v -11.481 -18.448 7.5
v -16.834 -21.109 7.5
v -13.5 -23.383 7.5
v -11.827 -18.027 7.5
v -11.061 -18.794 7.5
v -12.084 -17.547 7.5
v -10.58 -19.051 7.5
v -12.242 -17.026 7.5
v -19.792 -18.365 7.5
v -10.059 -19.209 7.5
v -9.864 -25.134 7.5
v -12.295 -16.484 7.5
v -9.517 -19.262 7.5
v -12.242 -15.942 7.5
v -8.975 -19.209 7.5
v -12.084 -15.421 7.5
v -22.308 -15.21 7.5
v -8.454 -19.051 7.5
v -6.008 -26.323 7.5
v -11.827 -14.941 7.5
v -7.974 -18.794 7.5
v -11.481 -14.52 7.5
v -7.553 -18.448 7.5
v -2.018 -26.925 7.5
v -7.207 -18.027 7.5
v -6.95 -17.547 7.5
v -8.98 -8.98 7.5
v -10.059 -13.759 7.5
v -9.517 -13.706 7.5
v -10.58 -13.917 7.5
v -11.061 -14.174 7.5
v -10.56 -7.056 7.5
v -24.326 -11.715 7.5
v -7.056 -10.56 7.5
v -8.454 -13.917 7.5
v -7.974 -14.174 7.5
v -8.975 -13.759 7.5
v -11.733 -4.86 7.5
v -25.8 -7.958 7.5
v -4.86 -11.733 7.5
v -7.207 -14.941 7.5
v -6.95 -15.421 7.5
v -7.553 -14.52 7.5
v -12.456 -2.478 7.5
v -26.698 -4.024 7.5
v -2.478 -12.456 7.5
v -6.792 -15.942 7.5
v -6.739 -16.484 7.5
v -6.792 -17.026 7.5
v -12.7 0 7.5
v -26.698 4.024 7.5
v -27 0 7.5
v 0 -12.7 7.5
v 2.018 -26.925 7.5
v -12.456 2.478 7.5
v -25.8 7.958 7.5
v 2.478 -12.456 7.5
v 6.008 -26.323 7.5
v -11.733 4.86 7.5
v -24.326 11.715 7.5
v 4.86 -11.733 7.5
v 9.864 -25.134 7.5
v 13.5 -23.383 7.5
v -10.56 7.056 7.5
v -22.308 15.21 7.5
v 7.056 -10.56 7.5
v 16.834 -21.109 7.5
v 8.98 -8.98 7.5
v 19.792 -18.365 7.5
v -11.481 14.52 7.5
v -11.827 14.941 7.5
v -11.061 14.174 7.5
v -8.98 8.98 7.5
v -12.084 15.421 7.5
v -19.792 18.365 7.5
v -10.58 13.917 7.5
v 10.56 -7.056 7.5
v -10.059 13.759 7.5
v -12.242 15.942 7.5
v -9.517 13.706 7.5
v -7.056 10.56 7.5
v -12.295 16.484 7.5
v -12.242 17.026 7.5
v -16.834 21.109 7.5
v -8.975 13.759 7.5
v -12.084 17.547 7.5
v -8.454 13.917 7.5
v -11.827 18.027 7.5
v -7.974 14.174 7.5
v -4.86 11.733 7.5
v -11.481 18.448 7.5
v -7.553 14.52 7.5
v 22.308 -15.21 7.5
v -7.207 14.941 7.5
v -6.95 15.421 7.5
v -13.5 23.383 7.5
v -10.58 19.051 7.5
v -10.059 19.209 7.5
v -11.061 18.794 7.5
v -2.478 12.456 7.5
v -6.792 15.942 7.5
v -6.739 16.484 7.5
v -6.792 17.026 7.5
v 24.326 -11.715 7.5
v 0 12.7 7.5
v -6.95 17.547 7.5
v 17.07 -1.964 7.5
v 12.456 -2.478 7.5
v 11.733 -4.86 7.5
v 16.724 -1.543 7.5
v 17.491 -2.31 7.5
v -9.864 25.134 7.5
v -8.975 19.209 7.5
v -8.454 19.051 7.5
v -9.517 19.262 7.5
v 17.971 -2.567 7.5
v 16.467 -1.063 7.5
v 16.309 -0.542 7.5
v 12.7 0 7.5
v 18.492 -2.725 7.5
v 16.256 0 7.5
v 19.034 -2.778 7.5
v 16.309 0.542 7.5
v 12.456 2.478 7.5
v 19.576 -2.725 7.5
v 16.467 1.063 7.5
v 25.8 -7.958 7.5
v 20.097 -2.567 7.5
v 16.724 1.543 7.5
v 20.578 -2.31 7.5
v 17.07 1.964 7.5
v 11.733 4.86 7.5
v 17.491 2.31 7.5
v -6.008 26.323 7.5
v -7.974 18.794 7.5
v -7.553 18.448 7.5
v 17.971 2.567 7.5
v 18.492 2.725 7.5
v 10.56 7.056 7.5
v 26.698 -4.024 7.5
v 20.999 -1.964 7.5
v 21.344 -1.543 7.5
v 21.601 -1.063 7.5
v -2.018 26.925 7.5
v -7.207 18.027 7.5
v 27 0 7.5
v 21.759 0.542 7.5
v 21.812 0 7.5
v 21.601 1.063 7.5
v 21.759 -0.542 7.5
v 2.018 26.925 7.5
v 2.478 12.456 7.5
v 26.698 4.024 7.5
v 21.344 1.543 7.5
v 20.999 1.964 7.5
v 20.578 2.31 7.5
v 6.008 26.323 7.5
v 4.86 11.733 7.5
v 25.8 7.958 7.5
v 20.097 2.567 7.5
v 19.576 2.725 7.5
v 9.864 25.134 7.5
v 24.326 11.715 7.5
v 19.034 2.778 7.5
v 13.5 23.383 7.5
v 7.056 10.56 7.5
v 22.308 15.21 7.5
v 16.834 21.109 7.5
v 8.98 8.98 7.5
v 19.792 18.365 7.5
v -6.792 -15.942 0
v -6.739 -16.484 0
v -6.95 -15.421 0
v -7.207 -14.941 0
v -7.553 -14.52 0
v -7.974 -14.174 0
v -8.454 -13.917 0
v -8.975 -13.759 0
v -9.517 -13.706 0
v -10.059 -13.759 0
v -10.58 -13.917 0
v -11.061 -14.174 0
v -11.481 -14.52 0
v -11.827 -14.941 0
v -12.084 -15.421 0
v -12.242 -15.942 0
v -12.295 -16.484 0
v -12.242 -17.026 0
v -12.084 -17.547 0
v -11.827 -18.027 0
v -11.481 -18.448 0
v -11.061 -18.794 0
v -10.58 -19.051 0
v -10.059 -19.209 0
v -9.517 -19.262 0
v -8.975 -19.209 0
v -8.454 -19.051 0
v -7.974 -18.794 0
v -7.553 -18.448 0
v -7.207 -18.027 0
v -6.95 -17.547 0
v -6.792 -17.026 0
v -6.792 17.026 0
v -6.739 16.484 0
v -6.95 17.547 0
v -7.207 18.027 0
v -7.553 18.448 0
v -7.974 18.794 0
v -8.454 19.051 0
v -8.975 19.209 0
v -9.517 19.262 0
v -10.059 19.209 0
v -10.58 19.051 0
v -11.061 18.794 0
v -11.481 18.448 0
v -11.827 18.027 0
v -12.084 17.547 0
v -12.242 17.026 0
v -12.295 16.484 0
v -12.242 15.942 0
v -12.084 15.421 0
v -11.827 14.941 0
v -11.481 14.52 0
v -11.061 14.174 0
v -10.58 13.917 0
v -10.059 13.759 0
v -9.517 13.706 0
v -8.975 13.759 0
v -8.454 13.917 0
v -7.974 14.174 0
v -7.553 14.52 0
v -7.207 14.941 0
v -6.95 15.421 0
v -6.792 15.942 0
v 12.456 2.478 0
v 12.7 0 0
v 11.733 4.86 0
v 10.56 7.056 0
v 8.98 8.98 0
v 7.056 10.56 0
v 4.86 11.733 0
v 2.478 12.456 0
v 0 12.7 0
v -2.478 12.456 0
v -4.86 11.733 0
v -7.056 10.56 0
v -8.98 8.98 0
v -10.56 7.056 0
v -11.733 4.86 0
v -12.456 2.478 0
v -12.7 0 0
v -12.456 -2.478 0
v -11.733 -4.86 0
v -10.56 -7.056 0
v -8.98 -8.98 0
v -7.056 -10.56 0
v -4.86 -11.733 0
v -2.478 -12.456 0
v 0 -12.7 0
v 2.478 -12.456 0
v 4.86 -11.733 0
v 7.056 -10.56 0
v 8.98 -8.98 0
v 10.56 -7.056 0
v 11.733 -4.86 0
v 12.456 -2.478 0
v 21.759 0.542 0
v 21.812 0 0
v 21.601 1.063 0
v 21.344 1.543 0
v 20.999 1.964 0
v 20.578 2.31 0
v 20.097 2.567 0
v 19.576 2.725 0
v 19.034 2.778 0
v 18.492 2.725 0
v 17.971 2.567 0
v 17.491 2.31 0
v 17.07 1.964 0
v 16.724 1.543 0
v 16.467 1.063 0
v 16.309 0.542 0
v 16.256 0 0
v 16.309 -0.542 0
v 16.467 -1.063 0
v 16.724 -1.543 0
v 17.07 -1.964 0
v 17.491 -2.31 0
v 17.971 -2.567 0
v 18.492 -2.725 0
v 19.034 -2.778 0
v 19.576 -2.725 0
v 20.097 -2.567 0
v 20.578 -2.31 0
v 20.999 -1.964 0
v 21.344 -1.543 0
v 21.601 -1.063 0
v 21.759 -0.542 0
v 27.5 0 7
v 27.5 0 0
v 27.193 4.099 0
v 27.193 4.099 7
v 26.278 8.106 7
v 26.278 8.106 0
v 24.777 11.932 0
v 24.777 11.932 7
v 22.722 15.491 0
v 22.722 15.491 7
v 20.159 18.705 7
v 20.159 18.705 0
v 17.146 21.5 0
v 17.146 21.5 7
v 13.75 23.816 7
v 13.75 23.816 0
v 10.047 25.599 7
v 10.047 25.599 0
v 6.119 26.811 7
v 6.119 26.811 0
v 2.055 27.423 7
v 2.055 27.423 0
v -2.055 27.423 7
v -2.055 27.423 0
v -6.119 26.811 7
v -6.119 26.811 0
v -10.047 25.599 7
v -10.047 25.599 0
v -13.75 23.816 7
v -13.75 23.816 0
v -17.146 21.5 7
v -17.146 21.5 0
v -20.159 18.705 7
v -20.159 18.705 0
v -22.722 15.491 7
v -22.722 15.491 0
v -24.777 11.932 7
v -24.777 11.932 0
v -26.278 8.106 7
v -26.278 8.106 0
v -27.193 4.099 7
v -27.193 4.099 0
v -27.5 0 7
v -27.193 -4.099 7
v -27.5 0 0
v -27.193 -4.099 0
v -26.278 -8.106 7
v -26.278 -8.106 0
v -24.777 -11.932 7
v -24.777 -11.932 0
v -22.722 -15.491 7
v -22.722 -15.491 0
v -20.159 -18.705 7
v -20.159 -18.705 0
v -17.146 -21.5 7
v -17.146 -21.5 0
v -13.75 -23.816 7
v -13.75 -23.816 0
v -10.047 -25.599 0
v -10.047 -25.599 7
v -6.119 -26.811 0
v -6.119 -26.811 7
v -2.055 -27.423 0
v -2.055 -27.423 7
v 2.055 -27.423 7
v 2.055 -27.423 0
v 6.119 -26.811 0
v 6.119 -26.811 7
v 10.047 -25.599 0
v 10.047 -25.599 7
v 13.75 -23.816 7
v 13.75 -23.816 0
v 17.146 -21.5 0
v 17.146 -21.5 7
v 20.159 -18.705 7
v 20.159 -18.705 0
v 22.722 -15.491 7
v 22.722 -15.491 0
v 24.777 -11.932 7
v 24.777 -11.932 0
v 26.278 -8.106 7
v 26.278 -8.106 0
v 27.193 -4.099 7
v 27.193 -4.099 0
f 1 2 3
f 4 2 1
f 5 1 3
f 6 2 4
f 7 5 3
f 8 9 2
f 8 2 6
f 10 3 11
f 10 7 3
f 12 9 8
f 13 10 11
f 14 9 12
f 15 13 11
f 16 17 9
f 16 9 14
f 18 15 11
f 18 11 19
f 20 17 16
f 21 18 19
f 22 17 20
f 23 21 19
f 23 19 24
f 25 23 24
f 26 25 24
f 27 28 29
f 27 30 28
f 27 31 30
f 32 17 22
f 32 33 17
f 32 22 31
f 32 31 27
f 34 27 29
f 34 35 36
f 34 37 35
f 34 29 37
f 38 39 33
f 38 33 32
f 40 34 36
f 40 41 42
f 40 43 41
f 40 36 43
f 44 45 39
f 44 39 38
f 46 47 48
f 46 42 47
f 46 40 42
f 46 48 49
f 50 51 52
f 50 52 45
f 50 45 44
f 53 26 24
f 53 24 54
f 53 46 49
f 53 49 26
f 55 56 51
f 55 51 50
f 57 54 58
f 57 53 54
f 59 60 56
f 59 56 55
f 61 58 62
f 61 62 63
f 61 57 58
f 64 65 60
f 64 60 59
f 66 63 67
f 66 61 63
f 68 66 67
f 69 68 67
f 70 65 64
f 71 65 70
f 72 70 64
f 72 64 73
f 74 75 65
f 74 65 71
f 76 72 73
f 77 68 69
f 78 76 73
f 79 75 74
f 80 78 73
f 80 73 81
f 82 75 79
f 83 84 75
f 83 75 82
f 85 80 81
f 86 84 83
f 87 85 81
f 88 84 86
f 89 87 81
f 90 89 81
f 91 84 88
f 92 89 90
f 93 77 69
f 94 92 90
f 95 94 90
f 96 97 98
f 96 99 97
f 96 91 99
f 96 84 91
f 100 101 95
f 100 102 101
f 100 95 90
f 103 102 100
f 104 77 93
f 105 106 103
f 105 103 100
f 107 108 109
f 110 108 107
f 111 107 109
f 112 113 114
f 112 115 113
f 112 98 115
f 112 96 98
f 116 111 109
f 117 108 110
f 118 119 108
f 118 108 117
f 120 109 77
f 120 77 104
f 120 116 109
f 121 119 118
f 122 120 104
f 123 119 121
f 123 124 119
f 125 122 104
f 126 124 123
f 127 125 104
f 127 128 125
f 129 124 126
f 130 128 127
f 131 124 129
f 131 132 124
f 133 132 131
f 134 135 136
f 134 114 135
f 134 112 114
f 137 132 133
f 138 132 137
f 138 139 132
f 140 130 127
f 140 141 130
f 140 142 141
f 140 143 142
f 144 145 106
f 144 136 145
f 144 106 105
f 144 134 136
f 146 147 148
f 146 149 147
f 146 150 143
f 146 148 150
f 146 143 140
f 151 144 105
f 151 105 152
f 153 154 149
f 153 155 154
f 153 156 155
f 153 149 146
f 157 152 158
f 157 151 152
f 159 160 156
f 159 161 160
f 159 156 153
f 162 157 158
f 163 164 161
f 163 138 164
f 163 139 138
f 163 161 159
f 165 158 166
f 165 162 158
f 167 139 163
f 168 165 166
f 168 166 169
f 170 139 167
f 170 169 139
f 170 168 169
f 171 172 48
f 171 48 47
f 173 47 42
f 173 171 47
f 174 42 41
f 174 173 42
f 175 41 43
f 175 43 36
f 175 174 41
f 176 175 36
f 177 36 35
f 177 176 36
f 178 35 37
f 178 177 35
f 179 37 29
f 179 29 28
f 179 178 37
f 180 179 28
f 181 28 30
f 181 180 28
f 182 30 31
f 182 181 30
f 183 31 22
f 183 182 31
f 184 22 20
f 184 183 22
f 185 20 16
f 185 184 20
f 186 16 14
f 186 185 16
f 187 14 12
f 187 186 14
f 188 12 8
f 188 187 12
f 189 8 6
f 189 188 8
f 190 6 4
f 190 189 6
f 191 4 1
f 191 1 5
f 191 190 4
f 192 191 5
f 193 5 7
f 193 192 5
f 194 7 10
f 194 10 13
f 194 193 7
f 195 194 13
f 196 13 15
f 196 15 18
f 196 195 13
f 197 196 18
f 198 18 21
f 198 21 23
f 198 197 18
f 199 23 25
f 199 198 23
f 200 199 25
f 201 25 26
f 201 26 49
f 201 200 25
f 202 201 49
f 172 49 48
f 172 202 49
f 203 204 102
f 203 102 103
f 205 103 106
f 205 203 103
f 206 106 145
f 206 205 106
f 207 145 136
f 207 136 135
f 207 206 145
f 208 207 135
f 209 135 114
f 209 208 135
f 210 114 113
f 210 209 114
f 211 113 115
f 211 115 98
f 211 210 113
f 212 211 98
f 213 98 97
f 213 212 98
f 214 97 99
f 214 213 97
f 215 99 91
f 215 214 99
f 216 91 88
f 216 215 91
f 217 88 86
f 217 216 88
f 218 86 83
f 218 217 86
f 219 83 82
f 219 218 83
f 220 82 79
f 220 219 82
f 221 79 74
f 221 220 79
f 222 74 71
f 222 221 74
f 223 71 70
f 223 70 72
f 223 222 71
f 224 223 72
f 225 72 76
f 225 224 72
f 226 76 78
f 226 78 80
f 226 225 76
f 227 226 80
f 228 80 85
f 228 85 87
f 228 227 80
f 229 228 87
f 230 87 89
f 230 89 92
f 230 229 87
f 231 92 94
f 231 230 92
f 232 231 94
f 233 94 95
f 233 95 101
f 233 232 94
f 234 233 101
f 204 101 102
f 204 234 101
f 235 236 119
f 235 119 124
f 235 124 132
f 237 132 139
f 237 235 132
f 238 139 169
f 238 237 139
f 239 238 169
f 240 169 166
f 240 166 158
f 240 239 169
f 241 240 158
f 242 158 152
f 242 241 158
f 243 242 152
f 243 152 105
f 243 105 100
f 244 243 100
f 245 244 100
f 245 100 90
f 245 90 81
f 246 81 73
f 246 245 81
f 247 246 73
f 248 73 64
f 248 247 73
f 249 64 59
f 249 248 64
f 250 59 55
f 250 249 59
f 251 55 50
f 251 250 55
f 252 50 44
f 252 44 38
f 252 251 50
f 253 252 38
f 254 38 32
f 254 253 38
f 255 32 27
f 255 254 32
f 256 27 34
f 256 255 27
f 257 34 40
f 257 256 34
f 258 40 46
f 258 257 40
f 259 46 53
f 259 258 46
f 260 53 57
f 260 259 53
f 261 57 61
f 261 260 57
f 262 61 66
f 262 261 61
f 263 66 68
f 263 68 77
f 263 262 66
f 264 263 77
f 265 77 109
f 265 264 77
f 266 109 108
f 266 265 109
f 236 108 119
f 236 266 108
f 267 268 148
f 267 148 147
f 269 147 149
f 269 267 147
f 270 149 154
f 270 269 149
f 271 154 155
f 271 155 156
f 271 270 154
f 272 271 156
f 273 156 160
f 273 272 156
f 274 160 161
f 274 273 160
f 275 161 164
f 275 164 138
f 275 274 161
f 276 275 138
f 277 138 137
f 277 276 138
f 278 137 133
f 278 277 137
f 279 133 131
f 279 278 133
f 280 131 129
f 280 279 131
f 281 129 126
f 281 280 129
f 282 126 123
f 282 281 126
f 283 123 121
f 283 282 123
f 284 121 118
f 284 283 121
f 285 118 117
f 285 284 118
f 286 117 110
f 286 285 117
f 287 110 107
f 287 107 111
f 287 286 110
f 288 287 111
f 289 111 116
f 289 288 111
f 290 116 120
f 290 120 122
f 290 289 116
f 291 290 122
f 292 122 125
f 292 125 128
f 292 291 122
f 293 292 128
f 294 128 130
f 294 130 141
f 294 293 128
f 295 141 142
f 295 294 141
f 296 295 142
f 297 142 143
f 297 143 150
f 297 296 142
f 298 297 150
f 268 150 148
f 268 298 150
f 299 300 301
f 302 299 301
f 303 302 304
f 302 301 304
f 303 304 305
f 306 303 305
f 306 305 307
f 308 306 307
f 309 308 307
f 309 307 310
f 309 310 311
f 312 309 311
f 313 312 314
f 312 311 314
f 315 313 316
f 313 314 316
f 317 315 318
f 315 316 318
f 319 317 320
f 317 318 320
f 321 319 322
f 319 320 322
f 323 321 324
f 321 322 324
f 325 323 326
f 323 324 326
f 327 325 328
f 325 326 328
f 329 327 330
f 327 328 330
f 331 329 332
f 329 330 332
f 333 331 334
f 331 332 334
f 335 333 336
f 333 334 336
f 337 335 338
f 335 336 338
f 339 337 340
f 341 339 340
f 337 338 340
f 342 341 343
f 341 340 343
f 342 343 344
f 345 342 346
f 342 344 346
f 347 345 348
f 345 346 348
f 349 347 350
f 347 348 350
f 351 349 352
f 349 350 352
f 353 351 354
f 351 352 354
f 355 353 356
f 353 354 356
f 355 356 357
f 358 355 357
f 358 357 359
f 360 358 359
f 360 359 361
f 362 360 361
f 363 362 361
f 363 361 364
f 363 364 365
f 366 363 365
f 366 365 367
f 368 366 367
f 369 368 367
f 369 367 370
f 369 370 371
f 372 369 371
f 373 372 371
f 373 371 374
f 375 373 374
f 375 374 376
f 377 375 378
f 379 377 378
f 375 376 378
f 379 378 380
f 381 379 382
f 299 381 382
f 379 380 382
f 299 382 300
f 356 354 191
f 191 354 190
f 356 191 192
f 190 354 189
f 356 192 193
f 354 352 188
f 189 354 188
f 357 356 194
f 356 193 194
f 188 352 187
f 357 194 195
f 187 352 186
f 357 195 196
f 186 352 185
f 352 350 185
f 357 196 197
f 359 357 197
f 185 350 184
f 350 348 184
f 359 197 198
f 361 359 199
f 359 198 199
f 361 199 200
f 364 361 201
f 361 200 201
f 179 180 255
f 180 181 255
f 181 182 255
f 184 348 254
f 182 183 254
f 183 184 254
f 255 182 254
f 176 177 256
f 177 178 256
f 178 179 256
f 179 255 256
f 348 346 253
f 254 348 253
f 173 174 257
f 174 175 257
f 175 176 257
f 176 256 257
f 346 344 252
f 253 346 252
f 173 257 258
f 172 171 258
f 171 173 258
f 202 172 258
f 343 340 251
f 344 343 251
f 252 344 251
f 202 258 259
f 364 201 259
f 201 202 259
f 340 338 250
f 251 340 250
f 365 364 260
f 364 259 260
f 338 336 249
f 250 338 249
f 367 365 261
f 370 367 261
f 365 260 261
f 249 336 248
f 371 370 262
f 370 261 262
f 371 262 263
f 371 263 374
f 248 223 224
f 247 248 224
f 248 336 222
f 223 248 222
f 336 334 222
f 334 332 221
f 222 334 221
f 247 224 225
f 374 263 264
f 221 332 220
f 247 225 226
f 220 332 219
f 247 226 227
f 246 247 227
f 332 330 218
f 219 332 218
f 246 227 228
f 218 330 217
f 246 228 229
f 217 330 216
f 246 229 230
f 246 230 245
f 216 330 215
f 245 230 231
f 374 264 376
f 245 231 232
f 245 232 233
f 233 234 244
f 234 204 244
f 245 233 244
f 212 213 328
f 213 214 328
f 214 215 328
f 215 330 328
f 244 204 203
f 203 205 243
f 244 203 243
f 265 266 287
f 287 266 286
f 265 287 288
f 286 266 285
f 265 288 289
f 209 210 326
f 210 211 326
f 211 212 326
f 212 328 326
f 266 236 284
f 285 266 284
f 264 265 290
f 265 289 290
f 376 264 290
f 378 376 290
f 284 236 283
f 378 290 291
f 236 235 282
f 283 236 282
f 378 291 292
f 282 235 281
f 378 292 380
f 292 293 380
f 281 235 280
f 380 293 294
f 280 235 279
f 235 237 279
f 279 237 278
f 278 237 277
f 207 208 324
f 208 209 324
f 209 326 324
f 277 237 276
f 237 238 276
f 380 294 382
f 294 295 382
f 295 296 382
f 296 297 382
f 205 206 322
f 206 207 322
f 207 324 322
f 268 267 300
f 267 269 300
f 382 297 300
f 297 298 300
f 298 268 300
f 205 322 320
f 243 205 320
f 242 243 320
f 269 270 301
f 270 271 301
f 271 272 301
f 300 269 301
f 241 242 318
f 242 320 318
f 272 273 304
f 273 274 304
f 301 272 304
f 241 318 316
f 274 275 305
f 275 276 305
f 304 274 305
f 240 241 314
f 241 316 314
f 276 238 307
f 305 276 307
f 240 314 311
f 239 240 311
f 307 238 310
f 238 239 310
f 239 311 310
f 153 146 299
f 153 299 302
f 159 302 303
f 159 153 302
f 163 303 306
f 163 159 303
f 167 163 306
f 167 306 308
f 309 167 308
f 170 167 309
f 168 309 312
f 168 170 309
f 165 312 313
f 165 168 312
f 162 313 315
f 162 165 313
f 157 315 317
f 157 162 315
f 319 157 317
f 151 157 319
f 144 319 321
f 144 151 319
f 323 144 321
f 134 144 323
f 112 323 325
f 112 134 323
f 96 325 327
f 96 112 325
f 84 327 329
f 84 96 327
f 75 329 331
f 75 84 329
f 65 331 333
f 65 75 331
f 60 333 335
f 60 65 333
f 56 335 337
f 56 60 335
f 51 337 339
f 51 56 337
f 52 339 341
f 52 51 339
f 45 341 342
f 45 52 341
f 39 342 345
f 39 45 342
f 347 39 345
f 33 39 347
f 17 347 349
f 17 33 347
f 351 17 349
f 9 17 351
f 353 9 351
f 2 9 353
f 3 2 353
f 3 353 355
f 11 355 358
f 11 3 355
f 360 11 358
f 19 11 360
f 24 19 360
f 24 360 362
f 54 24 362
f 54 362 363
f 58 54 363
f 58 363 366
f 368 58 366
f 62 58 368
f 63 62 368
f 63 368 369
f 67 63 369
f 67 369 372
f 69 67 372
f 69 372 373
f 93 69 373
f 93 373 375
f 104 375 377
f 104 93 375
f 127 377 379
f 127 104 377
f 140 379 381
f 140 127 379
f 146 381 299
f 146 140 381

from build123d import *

# Parameters (mm, degrees)
SKETCH1_R           = 27.5
SKETCH1_R_2         = 2.778125
SKETCH1_R_3         = 12.7
BOSS_EXTRUDE1_DEPTH = 7.5
CHAMFER1_SIZE       = 0.5


with BuildPart() as part:
    # Sketch1 → Boss-Extrude1 (new body)
    with BuildSketch(Plane.XY):
        Circle(SKETCH1_R)
        with Locations((-9.5170625, 16.484035789)):
            Circle(SKETCH1_R_2, mode=Mode.SUBTRACT)
        with Locations((19.034125, 0)):
            Circle(SKETCH1_R_2, mode=Mode.SUBTRACT)
        with Locations((-9.5170625, -16.484035789)):
            Circle(SKETCH1_R_2, mode=Mode.SUBTRACT)
        Circle(SKETCH1_R_3, mode=Mode.SUBTRACT)
    extrude(amount=BOSS_EXTRUDE1_DEPTH)

    # Chamfer1
    chamfer1_edges = [part.edges().sort_by_distance(p)[0] for p in [
        (-27.5, 0, 7.5),
    ]]
    chamfer(chamfer1_edges, length=CHAMFER1_SIZE)


solid = part.part
